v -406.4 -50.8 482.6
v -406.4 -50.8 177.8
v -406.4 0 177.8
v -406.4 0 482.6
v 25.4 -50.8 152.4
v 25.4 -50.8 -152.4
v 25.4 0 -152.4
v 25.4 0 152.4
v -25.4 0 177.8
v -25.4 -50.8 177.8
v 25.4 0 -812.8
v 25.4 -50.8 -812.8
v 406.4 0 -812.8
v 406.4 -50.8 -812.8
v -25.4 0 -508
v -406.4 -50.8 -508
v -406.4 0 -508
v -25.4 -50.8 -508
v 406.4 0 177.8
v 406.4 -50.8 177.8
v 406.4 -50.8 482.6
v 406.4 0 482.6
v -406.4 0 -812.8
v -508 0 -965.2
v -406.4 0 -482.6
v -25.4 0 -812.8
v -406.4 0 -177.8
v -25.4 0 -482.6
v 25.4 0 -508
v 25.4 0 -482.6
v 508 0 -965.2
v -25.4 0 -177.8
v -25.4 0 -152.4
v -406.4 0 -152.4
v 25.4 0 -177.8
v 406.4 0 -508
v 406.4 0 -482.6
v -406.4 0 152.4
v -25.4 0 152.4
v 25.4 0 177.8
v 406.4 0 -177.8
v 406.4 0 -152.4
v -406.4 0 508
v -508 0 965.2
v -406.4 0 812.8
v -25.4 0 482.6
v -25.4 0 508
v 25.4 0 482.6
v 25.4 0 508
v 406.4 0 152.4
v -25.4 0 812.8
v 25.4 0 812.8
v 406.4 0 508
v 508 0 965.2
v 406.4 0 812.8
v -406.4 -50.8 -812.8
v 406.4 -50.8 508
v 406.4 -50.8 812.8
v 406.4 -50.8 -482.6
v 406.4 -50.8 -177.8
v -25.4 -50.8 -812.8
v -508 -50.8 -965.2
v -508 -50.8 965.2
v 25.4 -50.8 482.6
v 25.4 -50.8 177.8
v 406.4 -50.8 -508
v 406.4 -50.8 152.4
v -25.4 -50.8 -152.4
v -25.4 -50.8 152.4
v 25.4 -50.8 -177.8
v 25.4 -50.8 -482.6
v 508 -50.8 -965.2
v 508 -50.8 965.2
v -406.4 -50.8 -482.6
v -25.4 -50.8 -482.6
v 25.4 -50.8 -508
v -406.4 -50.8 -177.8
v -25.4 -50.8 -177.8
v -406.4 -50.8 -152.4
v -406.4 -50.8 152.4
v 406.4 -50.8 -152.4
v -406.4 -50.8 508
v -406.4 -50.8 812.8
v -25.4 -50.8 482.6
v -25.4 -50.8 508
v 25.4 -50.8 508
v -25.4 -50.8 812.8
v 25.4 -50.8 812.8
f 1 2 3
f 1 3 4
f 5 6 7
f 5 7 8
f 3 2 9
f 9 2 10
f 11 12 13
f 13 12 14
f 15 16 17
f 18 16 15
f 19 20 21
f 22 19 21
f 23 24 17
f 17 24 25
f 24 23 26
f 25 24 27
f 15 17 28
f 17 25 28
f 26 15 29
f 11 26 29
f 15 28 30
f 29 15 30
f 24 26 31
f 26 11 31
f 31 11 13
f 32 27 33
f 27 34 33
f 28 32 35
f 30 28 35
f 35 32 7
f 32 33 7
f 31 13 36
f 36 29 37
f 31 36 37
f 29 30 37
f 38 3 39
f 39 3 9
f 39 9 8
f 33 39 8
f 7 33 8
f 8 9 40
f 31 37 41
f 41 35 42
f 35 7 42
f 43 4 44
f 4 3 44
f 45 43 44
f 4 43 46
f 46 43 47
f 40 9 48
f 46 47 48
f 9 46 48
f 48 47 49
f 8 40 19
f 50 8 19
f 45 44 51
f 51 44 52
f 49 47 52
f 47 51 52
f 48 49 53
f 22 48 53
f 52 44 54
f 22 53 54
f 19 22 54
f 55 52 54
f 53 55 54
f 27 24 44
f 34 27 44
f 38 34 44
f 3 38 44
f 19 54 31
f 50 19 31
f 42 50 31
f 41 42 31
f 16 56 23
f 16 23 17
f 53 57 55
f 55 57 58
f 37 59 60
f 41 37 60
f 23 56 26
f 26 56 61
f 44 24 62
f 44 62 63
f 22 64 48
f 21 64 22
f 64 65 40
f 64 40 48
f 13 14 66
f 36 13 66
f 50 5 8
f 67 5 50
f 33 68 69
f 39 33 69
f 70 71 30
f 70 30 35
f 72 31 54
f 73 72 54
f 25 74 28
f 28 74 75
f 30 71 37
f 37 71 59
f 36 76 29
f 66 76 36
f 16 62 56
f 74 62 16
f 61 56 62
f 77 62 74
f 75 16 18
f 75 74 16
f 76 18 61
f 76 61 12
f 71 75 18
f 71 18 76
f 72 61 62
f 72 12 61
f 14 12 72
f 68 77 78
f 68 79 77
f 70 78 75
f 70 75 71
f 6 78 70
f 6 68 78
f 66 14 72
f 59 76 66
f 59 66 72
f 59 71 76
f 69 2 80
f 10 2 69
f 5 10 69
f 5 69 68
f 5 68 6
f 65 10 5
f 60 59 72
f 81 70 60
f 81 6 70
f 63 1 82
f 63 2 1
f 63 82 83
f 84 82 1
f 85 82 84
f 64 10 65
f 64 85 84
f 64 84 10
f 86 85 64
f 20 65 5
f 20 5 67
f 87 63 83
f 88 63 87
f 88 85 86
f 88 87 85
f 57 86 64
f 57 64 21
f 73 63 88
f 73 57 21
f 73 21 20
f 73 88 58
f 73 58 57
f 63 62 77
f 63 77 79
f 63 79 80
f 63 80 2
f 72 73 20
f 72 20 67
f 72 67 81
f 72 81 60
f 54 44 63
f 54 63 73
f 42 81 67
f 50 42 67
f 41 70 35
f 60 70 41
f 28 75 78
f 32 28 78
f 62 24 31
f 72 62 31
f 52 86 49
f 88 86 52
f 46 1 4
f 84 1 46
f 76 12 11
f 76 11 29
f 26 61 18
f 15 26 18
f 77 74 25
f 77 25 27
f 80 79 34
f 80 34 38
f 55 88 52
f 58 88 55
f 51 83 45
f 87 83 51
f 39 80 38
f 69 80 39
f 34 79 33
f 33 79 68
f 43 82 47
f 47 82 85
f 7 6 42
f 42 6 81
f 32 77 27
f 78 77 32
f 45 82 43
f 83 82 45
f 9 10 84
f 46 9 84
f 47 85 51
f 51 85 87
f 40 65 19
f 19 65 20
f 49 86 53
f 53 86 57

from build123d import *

# Parameters (mm, degrees)
F0_W     = 1016
F0_H     = 1930.4
F1_DEPTH = 50.8
F2_W     = 381
F2_H     = 304.8
F3_DEPTH = 50.801


with BuildPart() as f1:
    # F0 (on Front) → F1 (new body)
    with BuildSketch(Plane.XZ):
        Rectangle(F0_W, F0_H)
    extrude(amount=F1_DEPTH)

    # F2 (on face) → F3 (cut, through all)
    with BuildSketch(Plane.XZ.offset(50.8)):
        with Locations((-215.9, 660.4)):
            Rectangle(F2_W, F2_H)
        with Locations((-215.9, 330.2)):
            Rectangle(F2_W, F2_H)
        with Locations((-215.9, 0)):
            Rectangle(F2_W, F2_H)
        with Locations((-215.9, -330.2)):
            Rectangle(F2_W, F2_H)
        with Locations((-215.9, -660.4)):
            Rectangle(F2_W, F2_H)
        with Locations((215.9, 330.2)):
            Rectangle(F2_W, F2_H)
        with Locations((215.9, 660.4)):
            Rectangle(F2_W, F2_H)
        with Locations((215.9, 0)):
            Rectangle(F2_W, F2_H)
        with Locations((215.9, -330.2)):
            Rectangle(F2_W, F2_H)
        with Locations((215.9, -660.4)):
            Rectangle(F2_W, F2_H)
    extrude(amount=-F3_DEPTH, mode=Mode.SUBTRACT)


solid = f1.part
